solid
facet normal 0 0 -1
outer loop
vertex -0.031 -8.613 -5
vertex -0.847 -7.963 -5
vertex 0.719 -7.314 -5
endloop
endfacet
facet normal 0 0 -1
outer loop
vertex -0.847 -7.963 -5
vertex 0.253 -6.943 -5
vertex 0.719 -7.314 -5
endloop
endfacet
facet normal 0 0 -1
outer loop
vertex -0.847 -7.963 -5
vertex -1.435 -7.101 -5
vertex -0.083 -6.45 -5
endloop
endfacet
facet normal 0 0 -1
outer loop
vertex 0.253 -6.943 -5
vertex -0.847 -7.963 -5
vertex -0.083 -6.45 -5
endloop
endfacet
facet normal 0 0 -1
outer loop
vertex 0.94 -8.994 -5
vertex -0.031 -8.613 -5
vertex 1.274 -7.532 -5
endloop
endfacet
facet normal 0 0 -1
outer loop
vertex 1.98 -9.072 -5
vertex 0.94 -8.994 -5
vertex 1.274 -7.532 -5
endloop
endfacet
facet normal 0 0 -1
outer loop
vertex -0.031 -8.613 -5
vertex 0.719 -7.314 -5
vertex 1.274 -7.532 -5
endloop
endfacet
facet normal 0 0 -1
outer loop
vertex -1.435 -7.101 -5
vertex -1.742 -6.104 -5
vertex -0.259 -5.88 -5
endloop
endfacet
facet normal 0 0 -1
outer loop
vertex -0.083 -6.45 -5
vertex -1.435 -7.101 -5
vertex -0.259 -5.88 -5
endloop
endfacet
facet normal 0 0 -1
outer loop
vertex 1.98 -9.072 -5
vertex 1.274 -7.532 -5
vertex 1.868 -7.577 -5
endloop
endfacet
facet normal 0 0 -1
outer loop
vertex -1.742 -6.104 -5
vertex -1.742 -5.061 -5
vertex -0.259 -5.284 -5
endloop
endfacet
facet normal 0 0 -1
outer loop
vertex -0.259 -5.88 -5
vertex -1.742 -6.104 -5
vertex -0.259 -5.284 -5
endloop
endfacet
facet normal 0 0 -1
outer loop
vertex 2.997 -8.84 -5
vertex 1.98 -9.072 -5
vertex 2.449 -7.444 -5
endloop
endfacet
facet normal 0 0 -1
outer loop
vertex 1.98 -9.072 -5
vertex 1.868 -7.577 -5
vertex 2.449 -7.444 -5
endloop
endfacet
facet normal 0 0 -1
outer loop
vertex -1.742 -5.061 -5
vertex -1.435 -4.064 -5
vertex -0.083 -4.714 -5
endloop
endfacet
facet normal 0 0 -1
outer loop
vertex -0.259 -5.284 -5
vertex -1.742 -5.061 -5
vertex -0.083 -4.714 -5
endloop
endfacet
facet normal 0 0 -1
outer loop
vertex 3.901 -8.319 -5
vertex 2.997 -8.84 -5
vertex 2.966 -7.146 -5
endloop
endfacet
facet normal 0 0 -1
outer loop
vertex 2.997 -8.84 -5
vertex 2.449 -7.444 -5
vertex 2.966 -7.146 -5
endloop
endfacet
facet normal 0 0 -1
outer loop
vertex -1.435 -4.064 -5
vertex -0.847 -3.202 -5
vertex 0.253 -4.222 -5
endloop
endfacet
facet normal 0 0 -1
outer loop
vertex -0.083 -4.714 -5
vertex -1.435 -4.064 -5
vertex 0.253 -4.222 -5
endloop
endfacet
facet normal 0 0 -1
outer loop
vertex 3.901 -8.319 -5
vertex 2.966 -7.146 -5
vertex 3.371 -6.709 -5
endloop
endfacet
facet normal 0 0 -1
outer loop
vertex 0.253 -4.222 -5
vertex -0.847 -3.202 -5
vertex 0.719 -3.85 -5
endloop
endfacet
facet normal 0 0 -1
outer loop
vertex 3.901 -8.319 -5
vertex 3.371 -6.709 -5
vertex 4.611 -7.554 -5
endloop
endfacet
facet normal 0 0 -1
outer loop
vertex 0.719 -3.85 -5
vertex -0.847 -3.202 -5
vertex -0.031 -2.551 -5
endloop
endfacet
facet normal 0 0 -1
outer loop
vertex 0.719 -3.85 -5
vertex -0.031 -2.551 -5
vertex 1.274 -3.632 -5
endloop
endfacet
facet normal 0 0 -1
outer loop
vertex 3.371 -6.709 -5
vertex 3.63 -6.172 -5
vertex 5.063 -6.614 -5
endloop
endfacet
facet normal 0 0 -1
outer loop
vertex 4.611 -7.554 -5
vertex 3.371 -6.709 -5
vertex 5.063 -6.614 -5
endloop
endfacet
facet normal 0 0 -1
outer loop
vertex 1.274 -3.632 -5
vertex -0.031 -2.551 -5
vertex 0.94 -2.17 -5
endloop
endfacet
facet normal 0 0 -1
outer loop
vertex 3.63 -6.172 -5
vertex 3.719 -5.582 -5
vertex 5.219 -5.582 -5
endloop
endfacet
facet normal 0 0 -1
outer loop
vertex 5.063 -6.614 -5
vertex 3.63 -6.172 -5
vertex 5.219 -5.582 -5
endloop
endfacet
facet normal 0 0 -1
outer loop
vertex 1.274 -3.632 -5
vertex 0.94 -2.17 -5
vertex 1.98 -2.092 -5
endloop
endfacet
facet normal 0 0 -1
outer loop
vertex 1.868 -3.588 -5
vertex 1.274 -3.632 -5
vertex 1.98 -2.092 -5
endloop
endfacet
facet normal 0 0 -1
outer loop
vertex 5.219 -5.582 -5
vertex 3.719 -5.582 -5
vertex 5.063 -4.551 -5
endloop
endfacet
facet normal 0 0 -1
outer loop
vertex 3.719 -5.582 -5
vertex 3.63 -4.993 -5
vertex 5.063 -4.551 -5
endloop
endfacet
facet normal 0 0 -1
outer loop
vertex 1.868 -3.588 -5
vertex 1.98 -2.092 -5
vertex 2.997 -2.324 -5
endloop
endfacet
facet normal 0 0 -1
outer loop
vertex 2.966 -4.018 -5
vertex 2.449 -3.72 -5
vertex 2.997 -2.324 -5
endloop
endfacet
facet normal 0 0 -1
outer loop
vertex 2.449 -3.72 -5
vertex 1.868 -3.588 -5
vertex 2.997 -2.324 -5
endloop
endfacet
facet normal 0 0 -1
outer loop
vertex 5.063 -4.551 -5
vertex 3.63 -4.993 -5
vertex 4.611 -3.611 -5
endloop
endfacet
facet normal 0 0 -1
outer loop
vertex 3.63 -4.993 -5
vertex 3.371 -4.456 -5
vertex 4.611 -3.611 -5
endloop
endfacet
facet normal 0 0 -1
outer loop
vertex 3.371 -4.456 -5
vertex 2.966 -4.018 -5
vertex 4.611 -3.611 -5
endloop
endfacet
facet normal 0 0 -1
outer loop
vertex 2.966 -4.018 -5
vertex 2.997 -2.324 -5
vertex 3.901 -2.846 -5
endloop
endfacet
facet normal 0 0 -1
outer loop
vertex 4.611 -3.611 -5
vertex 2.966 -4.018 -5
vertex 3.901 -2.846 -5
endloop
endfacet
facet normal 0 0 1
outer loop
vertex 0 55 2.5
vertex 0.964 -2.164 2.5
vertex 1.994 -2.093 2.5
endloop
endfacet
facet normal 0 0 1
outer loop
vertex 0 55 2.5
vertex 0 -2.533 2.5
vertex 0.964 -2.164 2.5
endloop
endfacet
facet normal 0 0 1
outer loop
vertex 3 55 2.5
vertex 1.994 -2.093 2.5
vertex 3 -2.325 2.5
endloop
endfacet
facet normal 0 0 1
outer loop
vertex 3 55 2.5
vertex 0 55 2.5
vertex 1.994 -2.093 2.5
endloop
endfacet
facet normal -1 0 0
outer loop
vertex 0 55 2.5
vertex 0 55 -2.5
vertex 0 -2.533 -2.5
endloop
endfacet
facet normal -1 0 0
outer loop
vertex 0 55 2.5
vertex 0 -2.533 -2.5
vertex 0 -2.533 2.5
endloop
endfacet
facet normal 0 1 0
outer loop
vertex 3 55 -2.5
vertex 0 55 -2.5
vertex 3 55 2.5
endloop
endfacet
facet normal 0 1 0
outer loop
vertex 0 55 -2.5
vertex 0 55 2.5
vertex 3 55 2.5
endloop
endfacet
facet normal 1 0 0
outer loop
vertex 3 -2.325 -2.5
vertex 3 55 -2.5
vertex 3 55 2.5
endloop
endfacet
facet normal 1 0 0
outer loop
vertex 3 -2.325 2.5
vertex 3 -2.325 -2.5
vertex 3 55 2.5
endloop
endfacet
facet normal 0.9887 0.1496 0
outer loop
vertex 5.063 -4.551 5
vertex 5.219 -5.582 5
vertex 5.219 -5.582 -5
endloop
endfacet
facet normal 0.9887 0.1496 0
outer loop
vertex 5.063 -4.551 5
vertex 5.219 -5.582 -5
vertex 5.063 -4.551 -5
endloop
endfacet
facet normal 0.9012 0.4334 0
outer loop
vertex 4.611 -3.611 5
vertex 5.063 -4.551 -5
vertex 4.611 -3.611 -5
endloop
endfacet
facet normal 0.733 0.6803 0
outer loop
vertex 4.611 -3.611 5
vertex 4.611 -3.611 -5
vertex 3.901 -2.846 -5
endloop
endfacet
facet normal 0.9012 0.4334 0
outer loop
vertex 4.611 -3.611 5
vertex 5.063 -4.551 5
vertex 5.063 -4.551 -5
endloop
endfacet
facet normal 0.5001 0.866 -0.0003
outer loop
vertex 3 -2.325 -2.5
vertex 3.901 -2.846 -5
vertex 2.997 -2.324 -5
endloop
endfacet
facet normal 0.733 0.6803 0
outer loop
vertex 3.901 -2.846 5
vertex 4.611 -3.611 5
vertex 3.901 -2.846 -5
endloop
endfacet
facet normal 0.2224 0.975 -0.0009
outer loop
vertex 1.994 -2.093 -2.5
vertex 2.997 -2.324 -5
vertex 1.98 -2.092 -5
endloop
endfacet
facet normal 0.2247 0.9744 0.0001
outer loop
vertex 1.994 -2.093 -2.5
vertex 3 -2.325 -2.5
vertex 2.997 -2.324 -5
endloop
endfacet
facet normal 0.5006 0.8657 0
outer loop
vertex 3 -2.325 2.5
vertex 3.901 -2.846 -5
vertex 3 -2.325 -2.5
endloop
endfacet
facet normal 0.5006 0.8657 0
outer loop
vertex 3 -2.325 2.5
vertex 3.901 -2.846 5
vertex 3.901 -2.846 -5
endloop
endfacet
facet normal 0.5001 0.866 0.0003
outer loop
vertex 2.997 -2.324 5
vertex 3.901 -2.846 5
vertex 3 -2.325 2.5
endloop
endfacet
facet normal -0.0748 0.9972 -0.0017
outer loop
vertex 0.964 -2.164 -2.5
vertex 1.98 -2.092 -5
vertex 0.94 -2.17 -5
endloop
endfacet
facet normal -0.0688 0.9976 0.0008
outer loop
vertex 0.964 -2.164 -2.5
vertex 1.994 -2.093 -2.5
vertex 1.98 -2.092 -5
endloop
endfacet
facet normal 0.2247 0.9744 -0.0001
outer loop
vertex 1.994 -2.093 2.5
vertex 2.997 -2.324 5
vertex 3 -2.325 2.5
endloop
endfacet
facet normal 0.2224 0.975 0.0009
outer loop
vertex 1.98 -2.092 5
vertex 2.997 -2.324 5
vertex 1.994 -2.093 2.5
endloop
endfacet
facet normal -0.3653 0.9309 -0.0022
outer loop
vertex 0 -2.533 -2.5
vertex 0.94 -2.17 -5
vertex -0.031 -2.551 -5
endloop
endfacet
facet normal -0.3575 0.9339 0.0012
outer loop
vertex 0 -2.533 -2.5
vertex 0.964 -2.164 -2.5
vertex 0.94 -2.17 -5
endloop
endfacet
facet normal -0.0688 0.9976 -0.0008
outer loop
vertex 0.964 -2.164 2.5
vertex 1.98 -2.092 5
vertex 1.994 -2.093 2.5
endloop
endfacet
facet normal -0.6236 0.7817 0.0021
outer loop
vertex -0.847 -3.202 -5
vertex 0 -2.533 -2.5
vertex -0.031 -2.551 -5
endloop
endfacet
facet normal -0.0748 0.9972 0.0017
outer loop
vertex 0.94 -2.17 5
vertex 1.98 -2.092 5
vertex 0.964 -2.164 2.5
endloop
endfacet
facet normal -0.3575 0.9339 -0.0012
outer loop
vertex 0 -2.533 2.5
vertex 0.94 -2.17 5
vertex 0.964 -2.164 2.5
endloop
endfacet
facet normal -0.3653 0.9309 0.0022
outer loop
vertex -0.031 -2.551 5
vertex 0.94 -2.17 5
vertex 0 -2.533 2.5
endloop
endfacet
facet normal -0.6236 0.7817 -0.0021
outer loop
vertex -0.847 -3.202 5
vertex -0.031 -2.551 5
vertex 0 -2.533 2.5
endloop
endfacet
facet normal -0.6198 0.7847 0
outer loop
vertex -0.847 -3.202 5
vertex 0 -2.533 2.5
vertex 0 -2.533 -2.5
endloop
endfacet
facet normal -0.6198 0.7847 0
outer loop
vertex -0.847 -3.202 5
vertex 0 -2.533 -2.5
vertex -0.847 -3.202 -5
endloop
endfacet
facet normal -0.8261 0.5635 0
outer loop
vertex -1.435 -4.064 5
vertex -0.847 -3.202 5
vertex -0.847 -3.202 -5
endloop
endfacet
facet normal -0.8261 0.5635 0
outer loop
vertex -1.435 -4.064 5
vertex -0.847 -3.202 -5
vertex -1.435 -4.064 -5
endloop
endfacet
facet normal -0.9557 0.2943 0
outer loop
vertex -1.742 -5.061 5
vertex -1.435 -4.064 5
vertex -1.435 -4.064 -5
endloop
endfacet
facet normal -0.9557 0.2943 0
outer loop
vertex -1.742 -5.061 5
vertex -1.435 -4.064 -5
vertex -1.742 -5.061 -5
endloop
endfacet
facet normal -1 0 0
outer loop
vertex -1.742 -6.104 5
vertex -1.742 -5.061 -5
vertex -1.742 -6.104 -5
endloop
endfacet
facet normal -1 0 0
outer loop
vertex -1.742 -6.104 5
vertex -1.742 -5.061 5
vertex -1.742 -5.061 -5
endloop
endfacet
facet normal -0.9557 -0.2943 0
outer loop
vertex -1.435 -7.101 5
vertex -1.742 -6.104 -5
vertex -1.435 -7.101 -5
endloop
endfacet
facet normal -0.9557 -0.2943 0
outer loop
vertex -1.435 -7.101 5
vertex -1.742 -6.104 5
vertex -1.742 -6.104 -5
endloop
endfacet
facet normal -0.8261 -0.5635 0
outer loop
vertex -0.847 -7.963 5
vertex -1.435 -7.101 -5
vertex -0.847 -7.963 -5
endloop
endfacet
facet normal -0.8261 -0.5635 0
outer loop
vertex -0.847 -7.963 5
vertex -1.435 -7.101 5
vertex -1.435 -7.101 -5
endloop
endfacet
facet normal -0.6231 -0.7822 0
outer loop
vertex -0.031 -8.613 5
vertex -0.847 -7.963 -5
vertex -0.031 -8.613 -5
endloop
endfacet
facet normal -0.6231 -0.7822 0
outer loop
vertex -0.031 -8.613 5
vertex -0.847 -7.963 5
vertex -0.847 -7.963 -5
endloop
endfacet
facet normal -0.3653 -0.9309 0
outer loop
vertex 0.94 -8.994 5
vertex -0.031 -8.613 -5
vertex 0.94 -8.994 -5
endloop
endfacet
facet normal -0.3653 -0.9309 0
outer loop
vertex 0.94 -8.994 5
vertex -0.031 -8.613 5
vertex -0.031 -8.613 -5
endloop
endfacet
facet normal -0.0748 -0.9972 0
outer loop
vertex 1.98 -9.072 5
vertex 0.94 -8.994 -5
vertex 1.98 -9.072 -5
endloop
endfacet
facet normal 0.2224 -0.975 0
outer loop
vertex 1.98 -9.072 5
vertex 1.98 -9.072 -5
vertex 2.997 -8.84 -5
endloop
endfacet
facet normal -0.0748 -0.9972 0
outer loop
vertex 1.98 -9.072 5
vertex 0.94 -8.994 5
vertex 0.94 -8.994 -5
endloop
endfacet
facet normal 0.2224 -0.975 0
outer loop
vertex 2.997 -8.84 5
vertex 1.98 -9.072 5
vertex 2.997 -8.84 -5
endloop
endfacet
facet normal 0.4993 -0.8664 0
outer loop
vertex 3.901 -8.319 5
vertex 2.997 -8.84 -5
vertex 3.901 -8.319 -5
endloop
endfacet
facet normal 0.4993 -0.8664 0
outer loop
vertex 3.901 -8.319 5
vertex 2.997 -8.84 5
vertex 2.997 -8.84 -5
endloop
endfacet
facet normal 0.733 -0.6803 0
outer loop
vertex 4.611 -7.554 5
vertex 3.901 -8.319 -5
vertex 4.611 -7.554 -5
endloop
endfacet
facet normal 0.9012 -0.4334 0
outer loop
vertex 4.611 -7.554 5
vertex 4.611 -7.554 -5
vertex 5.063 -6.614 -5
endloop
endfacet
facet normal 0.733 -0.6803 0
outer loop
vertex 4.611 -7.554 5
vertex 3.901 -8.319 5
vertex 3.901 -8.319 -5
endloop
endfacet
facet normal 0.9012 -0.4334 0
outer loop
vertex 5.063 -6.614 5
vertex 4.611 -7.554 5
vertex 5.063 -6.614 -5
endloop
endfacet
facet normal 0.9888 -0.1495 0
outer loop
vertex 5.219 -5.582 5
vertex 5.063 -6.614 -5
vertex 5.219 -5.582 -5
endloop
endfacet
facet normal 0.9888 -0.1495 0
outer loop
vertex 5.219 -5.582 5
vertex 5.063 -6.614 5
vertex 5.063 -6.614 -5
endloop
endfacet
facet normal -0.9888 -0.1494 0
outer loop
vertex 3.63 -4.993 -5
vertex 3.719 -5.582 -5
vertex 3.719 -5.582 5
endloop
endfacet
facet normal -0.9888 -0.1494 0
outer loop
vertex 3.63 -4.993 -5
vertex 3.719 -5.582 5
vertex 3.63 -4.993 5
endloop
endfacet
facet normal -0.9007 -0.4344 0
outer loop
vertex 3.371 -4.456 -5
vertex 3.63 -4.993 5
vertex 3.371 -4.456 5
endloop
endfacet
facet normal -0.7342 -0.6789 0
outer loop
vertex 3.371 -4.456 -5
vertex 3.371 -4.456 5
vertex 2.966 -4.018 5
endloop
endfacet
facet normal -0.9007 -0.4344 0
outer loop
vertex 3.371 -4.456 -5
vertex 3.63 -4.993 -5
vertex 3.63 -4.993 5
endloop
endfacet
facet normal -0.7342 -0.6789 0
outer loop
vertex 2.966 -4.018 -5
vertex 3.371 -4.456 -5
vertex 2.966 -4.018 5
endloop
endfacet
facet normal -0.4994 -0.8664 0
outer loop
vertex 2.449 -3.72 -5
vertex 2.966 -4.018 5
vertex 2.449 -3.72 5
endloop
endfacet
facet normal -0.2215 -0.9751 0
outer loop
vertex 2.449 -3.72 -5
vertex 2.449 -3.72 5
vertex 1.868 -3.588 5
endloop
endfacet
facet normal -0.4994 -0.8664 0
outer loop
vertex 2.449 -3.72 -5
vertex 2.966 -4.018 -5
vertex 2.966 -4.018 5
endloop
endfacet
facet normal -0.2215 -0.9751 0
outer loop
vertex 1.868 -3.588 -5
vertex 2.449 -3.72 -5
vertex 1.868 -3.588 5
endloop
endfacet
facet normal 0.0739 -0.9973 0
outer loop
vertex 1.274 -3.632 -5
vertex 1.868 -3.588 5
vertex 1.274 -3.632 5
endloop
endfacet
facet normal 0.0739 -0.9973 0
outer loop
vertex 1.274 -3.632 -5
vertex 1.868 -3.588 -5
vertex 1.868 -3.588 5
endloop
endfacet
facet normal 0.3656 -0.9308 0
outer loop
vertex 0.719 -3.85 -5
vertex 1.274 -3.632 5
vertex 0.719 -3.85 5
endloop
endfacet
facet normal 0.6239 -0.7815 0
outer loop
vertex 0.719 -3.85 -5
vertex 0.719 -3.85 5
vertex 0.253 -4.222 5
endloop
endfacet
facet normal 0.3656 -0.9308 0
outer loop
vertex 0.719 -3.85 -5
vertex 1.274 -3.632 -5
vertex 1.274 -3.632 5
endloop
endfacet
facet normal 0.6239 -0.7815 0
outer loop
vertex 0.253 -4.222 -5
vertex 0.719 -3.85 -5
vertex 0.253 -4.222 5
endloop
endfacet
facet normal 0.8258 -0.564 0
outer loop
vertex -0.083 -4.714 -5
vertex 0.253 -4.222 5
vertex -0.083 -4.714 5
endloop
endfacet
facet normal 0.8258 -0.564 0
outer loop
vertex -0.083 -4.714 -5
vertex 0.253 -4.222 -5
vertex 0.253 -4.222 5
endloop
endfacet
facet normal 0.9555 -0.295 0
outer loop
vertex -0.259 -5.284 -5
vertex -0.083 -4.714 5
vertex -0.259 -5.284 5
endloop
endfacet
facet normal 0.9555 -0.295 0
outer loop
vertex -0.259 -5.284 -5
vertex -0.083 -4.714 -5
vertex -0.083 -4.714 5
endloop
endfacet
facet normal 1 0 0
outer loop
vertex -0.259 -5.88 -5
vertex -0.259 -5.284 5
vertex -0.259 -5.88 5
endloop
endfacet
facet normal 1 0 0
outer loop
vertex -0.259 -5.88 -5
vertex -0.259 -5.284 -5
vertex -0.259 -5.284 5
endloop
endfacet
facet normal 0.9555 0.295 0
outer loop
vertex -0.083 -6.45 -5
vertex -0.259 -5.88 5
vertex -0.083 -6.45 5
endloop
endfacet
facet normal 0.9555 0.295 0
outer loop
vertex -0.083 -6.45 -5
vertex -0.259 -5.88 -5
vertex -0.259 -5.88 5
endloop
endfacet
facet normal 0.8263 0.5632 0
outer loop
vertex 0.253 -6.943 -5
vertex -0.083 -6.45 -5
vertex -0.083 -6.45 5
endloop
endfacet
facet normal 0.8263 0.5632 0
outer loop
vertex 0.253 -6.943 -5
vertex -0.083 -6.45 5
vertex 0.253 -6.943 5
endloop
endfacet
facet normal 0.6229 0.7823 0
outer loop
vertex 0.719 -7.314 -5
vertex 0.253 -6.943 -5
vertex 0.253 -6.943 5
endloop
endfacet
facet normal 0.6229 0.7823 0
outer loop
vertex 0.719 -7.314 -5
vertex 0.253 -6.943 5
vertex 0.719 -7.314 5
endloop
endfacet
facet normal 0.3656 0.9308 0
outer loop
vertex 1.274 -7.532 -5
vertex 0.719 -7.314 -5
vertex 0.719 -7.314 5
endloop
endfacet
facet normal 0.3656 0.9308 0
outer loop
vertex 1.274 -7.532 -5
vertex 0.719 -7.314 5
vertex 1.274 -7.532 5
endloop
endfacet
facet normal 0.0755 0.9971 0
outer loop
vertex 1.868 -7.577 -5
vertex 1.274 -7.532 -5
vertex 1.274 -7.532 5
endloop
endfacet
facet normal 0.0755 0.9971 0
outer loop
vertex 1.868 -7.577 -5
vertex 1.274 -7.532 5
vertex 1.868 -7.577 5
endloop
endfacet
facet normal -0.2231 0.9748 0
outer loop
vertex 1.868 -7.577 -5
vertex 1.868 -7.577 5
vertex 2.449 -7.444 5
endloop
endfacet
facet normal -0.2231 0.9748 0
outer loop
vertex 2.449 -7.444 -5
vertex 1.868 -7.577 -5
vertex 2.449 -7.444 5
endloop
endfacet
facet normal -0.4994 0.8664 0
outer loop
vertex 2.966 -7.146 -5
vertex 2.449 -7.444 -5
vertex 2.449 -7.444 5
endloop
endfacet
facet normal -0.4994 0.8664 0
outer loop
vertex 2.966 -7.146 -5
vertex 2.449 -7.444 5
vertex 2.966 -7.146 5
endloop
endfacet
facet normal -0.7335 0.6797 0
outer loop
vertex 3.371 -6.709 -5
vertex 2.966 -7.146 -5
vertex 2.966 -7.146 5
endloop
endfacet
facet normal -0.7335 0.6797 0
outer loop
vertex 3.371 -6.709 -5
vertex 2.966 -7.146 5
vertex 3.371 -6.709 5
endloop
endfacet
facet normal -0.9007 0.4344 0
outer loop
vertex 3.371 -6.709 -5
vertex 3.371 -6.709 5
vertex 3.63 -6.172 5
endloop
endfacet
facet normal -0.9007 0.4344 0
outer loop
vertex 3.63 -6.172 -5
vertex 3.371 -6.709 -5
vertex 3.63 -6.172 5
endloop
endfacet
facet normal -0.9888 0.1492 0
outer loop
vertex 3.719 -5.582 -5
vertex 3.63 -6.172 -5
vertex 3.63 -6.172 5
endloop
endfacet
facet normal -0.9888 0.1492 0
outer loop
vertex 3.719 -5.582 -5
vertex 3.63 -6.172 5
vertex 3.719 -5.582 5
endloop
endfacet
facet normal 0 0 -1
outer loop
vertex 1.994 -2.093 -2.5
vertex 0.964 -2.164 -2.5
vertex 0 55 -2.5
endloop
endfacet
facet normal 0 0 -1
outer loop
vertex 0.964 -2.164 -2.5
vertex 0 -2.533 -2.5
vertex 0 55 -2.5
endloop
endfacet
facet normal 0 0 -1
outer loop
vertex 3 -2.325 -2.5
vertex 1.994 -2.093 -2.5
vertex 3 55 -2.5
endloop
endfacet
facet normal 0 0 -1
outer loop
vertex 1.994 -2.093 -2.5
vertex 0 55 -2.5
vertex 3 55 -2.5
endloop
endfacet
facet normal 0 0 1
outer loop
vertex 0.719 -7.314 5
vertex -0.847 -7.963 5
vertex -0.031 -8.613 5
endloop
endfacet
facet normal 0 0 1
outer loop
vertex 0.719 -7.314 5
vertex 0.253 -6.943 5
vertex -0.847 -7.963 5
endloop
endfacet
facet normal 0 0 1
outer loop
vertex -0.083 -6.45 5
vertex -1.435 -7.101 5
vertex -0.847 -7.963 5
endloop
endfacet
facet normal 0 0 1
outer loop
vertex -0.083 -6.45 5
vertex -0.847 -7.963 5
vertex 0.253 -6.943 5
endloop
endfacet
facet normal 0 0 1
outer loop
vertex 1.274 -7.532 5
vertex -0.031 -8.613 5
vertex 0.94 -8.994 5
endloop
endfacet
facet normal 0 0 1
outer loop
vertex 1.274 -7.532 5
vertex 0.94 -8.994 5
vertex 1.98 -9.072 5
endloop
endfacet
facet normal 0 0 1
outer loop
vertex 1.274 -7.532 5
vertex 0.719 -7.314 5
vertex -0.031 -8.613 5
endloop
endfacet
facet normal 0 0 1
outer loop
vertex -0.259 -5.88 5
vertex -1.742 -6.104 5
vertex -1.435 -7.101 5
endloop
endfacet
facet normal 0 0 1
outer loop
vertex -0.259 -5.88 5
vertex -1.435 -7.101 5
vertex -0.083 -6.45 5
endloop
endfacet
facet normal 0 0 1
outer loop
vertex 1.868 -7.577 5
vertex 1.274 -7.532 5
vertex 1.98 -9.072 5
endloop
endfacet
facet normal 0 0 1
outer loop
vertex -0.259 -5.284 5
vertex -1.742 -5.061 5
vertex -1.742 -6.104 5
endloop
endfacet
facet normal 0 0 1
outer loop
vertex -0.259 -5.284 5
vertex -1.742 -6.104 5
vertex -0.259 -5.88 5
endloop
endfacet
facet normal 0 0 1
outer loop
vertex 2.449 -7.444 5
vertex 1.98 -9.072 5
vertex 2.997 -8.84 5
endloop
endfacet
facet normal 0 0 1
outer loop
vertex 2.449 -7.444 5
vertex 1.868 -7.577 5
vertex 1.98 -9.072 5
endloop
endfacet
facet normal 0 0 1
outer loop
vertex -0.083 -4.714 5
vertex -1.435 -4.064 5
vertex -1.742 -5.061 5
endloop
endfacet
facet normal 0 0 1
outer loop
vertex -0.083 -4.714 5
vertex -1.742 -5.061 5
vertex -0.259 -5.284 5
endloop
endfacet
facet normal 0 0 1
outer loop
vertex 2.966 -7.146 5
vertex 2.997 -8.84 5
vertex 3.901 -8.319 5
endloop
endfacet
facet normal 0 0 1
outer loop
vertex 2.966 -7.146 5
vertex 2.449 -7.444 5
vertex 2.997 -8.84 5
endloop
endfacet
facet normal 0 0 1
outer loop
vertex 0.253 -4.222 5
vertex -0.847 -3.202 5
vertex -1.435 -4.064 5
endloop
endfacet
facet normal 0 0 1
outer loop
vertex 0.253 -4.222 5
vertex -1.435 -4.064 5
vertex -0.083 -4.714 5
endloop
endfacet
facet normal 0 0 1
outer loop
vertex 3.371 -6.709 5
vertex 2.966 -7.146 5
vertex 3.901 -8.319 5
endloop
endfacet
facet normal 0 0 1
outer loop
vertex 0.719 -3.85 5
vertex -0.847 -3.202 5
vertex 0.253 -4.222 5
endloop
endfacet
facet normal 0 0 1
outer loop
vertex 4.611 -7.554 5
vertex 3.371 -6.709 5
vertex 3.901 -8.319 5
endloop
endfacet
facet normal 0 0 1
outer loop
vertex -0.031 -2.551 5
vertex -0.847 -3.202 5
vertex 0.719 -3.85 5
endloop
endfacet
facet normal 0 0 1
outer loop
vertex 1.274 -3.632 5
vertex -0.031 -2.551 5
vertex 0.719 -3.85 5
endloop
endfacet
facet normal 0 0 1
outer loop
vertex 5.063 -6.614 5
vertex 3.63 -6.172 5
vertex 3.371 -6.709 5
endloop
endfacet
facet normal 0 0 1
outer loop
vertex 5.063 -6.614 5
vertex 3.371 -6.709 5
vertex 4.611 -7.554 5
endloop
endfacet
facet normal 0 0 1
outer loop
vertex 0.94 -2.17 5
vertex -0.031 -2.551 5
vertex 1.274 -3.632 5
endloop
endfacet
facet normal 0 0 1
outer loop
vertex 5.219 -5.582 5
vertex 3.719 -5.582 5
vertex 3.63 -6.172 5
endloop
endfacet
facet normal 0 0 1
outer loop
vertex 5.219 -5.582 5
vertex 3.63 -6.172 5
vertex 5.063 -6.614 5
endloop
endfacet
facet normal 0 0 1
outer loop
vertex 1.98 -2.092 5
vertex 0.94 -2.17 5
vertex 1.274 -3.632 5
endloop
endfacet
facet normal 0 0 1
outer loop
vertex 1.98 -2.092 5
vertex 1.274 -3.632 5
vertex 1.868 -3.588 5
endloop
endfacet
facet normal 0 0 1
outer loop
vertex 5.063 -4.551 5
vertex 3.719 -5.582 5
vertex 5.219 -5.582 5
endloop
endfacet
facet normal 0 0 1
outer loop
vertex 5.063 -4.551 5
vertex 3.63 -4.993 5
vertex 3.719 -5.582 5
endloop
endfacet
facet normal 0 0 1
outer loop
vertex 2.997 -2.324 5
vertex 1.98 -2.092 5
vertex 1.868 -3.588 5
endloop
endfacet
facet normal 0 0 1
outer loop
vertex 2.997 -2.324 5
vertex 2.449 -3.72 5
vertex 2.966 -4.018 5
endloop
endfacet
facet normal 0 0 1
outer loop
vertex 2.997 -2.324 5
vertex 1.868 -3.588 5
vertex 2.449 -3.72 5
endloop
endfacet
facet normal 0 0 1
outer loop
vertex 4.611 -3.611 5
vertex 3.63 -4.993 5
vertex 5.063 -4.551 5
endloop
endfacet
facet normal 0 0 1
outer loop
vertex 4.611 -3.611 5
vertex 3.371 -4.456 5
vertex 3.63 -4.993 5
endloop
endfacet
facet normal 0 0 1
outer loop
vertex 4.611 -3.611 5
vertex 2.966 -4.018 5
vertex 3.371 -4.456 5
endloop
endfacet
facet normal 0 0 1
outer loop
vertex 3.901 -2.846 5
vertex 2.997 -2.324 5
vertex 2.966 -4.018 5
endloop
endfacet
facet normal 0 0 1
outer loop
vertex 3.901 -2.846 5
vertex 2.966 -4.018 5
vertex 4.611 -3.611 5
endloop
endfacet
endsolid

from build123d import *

# Parameters (mm, degrees)
ESQUISSE1_W             = 3
ESQUISSE1_H             = 55
BOSS_EXTRU_1_DEPTH      = 2.5
ESQUISSE2_R             = 3.5
ESQUISSE2_R_2           = 2
BOSS_EXTRU_2_DEPTH      = 5
BOSS_EXTRU_3_REACH      = 57.473
BOSS_EXTRU_3_END_RADIUS = 2
ESQUISSE3_W             = 3
ESQUISSE3_H             = 5


with BuildPart() as part:
    # Esquisse1 → Boss.-Extru.1 (new, symmetric)
    with BuildSketch(Plane.XY):
        with Locations((1.5, 27.5)):
            Rectangle(ESQUISSE1_W, ESQUISSE1_H)
    extrude(amount=BOSS_EXTRU_1_DEPTH, both=True)



with BuildPart() as body_2:
    # Esquisse2 → Boss.-Extru.2 (new, symmetric)
    with BuildSketch(Plane.XY):
        with Locations((1.718667593, -5.582160954)):
            Circle(ESQUISSE2_R)
        with Locations((1.718667593, -5.582160954)):
            Circle(ESQUISSE2_R_2, mode=Mode.SUBTRACT)
    extrude(amount=BOSS_EXTRU_2_DEPTH, both=True)


with BuildPart() as part_1:
    add(part.part)

    add(body_2.part)  # Boss.-Extru.3 merges body 2
    # Boss.-Extru.3: up to this cylinder (the profile starts outside it)
    boss_extru_3_end = Plane(origin=(1.718667593, -5.582160954, 0), z_dir=(0, 0, -1)) * Cylinder(BOSS_EXTRU_3_END_RADIUS, 119.946, mode=Mode.PRIVATE)
    # Esquisse3 → Boss.-Extru.3 (add, up to the surface)
    with BuildSketch(Plane.XZ, mode=Mode.PRIVATE) as boss_extru_3_sk1:
        with Locations((1.5, 0)):
            Rectangle(ESQUISSE3_W, ESQUISSE3_H)
    boss_extru_3_tool1 = extrude(boss_extru_3_sk1.sketch, amount=BOSS_EXTRU_3_REACH, mode=Mode.PRIVATE) - boss_extru_3_end
    add(boss_extru_3_tool1.solids().sort_by_distance((1.5, 0, 0))[0])


solid = part_1.part
